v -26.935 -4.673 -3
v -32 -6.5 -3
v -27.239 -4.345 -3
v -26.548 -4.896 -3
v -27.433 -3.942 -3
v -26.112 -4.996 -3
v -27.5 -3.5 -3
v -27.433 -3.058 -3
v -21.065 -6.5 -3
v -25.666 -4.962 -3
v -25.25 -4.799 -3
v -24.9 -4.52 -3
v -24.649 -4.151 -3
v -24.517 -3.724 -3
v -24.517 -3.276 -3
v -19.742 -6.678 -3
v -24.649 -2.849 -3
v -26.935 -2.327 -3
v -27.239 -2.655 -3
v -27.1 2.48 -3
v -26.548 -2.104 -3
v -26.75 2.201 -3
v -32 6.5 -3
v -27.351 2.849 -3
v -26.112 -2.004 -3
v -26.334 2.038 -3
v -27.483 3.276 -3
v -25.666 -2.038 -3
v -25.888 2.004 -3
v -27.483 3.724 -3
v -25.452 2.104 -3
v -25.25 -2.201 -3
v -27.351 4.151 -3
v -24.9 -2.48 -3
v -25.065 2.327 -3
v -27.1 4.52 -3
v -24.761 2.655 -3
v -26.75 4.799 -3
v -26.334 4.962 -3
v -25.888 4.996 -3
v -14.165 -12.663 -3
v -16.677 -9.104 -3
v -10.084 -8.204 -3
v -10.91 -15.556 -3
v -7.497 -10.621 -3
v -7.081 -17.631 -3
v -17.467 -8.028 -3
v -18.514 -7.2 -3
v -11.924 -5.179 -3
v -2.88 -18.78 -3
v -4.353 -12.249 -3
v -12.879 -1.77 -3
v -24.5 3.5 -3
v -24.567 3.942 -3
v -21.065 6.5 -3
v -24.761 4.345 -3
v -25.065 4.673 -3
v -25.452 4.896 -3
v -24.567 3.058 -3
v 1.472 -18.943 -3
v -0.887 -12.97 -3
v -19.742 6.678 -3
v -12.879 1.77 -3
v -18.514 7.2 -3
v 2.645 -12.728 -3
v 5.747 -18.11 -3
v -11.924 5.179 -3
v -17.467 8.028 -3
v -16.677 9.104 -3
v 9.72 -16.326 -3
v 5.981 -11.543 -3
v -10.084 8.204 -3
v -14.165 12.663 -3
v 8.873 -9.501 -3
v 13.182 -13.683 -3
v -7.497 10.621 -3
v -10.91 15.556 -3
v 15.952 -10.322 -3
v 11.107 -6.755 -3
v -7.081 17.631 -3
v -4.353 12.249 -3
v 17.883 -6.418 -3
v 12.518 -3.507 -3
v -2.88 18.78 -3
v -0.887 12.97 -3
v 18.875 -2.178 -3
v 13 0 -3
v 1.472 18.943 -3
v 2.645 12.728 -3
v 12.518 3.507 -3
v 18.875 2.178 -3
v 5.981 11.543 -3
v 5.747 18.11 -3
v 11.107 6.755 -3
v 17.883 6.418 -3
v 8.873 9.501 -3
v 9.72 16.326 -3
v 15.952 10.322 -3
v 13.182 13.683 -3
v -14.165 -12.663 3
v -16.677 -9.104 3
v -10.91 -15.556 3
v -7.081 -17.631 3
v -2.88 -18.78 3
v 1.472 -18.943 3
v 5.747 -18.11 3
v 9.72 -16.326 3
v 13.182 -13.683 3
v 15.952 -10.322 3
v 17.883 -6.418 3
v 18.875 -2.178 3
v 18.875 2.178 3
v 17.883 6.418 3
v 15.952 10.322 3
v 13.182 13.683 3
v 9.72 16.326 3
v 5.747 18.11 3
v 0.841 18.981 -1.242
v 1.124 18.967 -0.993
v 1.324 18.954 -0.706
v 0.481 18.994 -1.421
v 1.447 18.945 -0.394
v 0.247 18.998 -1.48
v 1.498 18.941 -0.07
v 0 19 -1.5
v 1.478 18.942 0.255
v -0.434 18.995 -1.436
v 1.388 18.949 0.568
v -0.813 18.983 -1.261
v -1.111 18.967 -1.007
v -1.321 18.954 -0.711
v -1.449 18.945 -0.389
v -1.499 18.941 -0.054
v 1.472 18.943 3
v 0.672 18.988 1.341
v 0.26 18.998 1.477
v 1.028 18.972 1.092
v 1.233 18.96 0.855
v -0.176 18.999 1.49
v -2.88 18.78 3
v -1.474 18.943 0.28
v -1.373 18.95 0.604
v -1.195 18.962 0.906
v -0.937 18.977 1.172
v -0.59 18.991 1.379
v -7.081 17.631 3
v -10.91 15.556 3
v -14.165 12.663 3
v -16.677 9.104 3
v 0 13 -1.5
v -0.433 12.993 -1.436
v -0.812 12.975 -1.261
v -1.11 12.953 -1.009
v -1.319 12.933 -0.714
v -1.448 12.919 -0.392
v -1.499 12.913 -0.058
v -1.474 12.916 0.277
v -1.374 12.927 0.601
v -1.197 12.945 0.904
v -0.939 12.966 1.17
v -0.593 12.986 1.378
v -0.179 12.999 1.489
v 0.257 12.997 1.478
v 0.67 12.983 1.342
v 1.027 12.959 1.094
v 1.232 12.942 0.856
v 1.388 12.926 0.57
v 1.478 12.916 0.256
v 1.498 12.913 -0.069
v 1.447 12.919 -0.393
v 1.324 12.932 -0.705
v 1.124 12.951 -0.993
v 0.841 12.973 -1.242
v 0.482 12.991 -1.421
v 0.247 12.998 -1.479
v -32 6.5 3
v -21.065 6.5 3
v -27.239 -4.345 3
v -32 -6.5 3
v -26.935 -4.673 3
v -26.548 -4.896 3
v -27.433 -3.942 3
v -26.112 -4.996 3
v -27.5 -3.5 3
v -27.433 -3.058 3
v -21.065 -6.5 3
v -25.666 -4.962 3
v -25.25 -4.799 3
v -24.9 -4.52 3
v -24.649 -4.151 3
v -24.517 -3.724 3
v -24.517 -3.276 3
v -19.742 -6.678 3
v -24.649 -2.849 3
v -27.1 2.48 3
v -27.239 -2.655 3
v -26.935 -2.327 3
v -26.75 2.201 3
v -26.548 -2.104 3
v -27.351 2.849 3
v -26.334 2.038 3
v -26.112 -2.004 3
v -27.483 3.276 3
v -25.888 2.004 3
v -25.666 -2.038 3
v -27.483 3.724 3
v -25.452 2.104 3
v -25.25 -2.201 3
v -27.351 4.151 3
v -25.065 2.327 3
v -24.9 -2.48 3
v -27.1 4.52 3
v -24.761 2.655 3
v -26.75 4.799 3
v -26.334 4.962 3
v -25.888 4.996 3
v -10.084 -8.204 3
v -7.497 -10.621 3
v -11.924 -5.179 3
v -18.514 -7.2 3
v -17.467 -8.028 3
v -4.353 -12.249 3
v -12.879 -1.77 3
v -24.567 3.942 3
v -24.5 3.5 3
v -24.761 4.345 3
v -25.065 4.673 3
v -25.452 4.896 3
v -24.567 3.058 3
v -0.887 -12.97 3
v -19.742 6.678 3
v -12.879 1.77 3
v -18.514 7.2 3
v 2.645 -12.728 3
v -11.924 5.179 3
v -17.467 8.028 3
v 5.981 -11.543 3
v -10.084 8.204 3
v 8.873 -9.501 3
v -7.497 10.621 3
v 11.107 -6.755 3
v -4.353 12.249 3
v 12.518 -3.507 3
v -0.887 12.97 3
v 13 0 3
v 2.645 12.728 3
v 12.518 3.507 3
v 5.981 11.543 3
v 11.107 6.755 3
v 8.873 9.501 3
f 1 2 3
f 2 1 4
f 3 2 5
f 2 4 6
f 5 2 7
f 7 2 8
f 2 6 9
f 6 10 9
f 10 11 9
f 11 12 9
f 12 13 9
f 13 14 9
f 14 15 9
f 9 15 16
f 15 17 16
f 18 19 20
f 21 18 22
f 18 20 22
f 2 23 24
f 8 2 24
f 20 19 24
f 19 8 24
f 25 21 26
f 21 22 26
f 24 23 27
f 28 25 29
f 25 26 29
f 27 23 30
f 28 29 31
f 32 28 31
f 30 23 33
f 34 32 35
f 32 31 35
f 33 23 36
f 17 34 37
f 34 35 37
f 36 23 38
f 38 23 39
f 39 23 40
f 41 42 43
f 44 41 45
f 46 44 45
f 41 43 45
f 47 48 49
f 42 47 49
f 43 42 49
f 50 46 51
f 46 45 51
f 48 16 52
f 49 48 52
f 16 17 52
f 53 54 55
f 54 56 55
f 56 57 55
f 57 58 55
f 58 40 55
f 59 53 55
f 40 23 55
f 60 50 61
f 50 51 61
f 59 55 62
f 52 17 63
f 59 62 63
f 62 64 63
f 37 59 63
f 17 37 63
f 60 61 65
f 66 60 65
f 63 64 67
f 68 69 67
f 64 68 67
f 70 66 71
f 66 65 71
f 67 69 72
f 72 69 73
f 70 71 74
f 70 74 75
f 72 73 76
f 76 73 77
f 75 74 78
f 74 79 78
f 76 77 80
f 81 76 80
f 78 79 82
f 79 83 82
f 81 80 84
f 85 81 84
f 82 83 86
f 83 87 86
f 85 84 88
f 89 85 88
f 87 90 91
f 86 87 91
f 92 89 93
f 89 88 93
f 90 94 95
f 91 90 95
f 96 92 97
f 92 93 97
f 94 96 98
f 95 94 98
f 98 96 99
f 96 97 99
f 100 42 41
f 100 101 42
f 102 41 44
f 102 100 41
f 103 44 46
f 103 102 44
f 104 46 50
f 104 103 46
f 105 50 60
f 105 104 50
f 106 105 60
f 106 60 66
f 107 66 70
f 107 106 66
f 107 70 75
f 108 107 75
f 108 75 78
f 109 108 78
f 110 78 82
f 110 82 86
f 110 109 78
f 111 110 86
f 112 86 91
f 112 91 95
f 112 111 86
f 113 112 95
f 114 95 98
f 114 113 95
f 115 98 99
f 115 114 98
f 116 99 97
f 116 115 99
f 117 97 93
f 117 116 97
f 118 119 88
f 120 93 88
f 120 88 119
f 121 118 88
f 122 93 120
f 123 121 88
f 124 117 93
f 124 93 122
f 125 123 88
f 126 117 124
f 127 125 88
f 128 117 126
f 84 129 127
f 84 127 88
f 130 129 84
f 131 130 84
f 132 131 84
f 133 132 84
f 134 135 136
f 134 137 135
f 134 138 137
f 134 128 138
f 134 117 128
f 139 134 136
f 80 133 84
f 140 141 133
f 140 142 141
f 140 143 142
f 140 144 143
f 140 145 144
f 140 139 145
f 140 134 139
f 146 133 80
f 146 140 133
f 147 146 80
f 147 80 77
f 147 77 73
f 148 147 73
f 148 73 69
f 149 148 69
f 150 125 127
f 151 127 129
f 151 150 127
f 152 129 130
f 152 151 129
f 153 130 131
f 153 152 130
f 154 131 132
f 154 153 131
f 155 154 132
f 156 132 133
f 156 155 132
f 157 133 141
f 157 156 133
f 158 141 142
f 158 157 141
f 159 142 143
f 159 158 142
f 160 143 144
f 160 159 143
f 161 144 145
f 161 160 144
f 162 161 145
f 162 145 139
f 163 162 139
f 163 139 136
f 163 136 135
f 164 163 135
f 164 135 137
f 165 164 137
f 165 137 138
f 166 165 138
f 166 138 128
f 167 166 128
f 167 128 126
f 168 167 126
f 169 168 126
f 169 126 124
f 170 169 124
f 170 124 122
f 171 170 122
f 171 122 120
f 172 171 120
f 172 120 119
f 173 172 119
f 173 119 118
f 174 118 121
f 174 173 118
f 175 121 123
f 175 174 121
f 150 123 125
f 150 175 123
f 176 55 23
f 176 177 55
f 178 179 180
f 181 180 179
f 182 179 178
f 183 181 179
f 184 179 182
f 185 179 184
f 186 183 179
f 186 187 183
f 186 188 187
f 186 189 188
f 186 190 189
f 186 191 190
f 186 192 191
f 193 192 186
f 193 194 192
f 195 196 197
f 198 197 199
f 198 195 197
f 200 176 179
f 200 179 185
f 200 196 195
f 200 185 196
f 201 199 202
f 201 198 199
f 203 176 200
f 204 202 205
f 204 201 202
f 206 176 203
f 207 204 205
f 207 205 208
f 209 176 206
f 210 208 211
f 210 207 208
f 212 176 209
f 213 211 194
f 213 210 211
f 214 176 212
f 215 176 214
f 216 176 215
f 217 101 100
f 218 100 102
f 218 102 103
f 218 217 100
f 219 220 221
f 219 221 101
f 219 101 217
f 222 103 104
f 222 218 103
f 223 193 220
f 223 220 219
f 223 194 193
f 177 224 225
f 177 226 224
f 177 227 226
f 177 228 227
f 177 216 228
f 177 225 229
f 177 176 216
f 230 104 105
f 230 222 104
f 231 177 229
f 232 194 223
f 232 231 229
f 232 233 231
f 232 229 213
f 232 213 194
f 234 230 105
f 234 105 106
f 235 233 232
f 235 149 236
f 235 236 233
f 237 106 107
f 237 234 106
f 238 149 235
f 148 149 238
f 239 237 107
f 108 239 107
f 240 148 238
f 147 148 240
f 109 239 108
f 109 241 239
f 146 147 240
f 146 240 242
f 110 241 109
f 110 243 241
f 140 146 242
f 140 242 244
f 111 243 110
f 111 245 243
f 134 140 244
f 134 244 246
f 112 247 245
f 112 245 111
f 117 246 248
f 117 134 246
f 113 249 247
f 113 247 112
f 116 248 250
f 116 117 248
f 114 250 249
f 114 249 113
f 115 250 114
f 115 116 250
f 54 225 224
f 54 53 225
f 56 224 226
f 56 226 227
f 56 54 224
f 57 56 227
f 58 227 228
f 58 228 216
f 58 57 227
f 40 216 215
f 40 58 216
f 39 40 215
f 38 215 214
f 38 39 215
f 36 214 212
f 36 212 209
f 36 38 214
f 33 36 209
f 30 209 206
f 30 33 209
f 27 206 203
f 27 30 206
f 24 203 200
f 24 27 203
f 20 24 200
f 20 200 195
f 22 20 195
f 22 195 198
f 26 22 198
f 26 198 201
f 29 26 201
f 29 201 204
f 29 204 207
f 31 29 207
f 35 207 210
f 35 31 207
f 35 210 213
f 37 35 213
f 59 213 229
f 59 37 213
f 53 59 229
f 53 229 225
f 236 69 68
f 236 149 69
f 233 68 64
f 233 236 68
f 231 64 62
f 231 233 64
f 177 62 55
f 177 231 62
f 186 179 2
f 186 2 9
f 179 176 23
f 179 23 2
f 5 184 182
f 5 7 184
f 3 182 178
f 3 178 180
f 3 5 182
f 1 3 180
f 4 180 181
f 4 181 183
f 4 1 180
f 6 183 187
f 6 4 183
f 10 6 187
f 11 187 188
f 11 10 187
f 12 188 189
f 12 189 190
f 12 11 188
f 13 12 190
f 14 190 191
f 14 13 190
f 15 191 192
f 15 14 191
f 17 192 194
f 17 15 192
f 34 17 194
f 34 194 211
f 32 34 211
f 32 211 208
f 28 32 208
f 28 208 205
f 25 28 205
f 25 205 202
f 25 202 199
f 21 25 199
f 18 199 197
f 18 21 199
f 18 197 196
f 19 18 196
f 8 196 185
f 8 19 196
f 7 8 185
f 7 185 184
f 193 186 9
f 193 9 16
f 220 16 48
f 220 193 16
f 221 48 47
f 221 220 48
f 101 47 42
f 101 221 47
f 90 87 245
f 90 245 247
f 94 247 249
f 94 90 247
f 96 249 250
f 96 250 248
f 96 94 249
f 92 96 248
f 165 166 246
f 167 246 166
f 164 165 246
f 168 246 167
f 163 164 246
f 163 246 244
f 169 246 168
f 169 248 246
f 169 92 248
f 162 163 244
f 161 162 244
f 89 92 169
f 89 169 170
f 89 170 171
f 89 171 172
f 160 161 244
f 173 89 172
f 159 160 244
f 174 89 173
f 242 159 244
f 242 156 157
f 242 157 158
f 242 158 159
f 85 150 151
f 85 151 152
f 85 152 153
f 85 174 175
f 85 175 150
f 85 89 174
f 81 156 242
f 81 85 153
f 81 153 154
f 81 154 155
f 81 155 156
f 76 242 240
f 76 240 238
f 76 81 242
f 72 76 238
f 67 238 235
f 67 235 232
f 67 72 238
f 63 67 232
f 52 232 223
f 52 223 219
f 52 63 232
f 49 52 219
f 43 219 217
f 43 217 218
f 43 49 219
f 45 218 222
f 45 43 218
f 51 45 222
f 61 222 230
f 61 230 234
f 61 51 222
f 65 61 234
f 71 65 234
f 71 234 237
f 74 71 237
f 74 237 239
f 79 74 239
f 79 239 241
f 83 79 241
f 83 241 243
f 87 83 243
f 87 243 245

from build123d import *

# Parameters (mm, degrees)
SKETCH1_R               = 13
SKETCH1_R_2             = 1.5
BOSS_EXTRUDE1_DEPTH     = 3
CUT_EXTRUDE1_REACH      = 39.336
CUT_EXTRUDE1_END_RADIUS = 19
SKETCH2_R               = 1.5


with BuildPart() as part:
    # Sketch1 → Boss-Extrude1 (new, symmetric)
    with BuildSketch(Plane.XY):
        with BuildLine():
            Line((-21.065374433, 6.5), (-32, 6.5))
            Line((-32, 6.5), (-32, -6.5))
            Line((-32, -6.5), (-21.065374433, -6.5))
            ThreePointArc((-21.065374433, -6.5), (-18.513822618, -7.20004845), (-16.676754759, -9.104166667))
            ThreePointArc((-16.676754759, -9.104166667), (19, 0), (-16.676754759, 9.104166667))
            ThreePointArc((-16.676754759, 9.104166667), (-18.513822618, 7.20004845), (-21.065374433, 6.5))
        make_face()
        Circle(SKETCH1_R, mode=Mode.SUBTRACT)
        with Locations((-26, 3.5)):
            Circle(SKETCH1_R_2, mode=Mode.SUBTRACT)
        with Locations(Location((-26, -3.5, 0), (0, 0, 180))):
            Circle(SKETCH1_R_2, mode=Mode.SUBTRACT)
    extrude(amount=BOSS_EXTRUDE1_DEPTH, both=True)

    # Cut-Extrude1: up to this cylinder (the profile starts inside it)
    cut_extrude1_end = Plane(origin=(0, 0, 0), z_dir=(0, 0, -1)) * Cylinder(CUT_EXTRUDE1_END_RADIUS, 117.672, mode=Mode.PRIVATE)
    # Sketch2 → Cut-Extrude1 (cut, up to the surface)
    with BuildSketch(Plane(origin=(0, 0, 0), x_dir=(1, 0, 0), z_dir=(0, 1, 0)), mode=Mode.PRIVATE) as cut_extrude1_sk1:
        with Locations(Location((0, 0, 0), (0, 0, 90))):
            Circle(SKETCH2_R)
    cut_extrude1_tool1 = extrude(cut_extrude1_sk1.sketch, amount=CUT_EXTRUDE1_REACH, mode=Mode.PRIVATE) & cut_extrude1_end
    add(cut_extrude1_tool1.solids().sort_by_distance((0, 0, 0))[0], mode=Mode.SUBTRACT)


solid = part.part
